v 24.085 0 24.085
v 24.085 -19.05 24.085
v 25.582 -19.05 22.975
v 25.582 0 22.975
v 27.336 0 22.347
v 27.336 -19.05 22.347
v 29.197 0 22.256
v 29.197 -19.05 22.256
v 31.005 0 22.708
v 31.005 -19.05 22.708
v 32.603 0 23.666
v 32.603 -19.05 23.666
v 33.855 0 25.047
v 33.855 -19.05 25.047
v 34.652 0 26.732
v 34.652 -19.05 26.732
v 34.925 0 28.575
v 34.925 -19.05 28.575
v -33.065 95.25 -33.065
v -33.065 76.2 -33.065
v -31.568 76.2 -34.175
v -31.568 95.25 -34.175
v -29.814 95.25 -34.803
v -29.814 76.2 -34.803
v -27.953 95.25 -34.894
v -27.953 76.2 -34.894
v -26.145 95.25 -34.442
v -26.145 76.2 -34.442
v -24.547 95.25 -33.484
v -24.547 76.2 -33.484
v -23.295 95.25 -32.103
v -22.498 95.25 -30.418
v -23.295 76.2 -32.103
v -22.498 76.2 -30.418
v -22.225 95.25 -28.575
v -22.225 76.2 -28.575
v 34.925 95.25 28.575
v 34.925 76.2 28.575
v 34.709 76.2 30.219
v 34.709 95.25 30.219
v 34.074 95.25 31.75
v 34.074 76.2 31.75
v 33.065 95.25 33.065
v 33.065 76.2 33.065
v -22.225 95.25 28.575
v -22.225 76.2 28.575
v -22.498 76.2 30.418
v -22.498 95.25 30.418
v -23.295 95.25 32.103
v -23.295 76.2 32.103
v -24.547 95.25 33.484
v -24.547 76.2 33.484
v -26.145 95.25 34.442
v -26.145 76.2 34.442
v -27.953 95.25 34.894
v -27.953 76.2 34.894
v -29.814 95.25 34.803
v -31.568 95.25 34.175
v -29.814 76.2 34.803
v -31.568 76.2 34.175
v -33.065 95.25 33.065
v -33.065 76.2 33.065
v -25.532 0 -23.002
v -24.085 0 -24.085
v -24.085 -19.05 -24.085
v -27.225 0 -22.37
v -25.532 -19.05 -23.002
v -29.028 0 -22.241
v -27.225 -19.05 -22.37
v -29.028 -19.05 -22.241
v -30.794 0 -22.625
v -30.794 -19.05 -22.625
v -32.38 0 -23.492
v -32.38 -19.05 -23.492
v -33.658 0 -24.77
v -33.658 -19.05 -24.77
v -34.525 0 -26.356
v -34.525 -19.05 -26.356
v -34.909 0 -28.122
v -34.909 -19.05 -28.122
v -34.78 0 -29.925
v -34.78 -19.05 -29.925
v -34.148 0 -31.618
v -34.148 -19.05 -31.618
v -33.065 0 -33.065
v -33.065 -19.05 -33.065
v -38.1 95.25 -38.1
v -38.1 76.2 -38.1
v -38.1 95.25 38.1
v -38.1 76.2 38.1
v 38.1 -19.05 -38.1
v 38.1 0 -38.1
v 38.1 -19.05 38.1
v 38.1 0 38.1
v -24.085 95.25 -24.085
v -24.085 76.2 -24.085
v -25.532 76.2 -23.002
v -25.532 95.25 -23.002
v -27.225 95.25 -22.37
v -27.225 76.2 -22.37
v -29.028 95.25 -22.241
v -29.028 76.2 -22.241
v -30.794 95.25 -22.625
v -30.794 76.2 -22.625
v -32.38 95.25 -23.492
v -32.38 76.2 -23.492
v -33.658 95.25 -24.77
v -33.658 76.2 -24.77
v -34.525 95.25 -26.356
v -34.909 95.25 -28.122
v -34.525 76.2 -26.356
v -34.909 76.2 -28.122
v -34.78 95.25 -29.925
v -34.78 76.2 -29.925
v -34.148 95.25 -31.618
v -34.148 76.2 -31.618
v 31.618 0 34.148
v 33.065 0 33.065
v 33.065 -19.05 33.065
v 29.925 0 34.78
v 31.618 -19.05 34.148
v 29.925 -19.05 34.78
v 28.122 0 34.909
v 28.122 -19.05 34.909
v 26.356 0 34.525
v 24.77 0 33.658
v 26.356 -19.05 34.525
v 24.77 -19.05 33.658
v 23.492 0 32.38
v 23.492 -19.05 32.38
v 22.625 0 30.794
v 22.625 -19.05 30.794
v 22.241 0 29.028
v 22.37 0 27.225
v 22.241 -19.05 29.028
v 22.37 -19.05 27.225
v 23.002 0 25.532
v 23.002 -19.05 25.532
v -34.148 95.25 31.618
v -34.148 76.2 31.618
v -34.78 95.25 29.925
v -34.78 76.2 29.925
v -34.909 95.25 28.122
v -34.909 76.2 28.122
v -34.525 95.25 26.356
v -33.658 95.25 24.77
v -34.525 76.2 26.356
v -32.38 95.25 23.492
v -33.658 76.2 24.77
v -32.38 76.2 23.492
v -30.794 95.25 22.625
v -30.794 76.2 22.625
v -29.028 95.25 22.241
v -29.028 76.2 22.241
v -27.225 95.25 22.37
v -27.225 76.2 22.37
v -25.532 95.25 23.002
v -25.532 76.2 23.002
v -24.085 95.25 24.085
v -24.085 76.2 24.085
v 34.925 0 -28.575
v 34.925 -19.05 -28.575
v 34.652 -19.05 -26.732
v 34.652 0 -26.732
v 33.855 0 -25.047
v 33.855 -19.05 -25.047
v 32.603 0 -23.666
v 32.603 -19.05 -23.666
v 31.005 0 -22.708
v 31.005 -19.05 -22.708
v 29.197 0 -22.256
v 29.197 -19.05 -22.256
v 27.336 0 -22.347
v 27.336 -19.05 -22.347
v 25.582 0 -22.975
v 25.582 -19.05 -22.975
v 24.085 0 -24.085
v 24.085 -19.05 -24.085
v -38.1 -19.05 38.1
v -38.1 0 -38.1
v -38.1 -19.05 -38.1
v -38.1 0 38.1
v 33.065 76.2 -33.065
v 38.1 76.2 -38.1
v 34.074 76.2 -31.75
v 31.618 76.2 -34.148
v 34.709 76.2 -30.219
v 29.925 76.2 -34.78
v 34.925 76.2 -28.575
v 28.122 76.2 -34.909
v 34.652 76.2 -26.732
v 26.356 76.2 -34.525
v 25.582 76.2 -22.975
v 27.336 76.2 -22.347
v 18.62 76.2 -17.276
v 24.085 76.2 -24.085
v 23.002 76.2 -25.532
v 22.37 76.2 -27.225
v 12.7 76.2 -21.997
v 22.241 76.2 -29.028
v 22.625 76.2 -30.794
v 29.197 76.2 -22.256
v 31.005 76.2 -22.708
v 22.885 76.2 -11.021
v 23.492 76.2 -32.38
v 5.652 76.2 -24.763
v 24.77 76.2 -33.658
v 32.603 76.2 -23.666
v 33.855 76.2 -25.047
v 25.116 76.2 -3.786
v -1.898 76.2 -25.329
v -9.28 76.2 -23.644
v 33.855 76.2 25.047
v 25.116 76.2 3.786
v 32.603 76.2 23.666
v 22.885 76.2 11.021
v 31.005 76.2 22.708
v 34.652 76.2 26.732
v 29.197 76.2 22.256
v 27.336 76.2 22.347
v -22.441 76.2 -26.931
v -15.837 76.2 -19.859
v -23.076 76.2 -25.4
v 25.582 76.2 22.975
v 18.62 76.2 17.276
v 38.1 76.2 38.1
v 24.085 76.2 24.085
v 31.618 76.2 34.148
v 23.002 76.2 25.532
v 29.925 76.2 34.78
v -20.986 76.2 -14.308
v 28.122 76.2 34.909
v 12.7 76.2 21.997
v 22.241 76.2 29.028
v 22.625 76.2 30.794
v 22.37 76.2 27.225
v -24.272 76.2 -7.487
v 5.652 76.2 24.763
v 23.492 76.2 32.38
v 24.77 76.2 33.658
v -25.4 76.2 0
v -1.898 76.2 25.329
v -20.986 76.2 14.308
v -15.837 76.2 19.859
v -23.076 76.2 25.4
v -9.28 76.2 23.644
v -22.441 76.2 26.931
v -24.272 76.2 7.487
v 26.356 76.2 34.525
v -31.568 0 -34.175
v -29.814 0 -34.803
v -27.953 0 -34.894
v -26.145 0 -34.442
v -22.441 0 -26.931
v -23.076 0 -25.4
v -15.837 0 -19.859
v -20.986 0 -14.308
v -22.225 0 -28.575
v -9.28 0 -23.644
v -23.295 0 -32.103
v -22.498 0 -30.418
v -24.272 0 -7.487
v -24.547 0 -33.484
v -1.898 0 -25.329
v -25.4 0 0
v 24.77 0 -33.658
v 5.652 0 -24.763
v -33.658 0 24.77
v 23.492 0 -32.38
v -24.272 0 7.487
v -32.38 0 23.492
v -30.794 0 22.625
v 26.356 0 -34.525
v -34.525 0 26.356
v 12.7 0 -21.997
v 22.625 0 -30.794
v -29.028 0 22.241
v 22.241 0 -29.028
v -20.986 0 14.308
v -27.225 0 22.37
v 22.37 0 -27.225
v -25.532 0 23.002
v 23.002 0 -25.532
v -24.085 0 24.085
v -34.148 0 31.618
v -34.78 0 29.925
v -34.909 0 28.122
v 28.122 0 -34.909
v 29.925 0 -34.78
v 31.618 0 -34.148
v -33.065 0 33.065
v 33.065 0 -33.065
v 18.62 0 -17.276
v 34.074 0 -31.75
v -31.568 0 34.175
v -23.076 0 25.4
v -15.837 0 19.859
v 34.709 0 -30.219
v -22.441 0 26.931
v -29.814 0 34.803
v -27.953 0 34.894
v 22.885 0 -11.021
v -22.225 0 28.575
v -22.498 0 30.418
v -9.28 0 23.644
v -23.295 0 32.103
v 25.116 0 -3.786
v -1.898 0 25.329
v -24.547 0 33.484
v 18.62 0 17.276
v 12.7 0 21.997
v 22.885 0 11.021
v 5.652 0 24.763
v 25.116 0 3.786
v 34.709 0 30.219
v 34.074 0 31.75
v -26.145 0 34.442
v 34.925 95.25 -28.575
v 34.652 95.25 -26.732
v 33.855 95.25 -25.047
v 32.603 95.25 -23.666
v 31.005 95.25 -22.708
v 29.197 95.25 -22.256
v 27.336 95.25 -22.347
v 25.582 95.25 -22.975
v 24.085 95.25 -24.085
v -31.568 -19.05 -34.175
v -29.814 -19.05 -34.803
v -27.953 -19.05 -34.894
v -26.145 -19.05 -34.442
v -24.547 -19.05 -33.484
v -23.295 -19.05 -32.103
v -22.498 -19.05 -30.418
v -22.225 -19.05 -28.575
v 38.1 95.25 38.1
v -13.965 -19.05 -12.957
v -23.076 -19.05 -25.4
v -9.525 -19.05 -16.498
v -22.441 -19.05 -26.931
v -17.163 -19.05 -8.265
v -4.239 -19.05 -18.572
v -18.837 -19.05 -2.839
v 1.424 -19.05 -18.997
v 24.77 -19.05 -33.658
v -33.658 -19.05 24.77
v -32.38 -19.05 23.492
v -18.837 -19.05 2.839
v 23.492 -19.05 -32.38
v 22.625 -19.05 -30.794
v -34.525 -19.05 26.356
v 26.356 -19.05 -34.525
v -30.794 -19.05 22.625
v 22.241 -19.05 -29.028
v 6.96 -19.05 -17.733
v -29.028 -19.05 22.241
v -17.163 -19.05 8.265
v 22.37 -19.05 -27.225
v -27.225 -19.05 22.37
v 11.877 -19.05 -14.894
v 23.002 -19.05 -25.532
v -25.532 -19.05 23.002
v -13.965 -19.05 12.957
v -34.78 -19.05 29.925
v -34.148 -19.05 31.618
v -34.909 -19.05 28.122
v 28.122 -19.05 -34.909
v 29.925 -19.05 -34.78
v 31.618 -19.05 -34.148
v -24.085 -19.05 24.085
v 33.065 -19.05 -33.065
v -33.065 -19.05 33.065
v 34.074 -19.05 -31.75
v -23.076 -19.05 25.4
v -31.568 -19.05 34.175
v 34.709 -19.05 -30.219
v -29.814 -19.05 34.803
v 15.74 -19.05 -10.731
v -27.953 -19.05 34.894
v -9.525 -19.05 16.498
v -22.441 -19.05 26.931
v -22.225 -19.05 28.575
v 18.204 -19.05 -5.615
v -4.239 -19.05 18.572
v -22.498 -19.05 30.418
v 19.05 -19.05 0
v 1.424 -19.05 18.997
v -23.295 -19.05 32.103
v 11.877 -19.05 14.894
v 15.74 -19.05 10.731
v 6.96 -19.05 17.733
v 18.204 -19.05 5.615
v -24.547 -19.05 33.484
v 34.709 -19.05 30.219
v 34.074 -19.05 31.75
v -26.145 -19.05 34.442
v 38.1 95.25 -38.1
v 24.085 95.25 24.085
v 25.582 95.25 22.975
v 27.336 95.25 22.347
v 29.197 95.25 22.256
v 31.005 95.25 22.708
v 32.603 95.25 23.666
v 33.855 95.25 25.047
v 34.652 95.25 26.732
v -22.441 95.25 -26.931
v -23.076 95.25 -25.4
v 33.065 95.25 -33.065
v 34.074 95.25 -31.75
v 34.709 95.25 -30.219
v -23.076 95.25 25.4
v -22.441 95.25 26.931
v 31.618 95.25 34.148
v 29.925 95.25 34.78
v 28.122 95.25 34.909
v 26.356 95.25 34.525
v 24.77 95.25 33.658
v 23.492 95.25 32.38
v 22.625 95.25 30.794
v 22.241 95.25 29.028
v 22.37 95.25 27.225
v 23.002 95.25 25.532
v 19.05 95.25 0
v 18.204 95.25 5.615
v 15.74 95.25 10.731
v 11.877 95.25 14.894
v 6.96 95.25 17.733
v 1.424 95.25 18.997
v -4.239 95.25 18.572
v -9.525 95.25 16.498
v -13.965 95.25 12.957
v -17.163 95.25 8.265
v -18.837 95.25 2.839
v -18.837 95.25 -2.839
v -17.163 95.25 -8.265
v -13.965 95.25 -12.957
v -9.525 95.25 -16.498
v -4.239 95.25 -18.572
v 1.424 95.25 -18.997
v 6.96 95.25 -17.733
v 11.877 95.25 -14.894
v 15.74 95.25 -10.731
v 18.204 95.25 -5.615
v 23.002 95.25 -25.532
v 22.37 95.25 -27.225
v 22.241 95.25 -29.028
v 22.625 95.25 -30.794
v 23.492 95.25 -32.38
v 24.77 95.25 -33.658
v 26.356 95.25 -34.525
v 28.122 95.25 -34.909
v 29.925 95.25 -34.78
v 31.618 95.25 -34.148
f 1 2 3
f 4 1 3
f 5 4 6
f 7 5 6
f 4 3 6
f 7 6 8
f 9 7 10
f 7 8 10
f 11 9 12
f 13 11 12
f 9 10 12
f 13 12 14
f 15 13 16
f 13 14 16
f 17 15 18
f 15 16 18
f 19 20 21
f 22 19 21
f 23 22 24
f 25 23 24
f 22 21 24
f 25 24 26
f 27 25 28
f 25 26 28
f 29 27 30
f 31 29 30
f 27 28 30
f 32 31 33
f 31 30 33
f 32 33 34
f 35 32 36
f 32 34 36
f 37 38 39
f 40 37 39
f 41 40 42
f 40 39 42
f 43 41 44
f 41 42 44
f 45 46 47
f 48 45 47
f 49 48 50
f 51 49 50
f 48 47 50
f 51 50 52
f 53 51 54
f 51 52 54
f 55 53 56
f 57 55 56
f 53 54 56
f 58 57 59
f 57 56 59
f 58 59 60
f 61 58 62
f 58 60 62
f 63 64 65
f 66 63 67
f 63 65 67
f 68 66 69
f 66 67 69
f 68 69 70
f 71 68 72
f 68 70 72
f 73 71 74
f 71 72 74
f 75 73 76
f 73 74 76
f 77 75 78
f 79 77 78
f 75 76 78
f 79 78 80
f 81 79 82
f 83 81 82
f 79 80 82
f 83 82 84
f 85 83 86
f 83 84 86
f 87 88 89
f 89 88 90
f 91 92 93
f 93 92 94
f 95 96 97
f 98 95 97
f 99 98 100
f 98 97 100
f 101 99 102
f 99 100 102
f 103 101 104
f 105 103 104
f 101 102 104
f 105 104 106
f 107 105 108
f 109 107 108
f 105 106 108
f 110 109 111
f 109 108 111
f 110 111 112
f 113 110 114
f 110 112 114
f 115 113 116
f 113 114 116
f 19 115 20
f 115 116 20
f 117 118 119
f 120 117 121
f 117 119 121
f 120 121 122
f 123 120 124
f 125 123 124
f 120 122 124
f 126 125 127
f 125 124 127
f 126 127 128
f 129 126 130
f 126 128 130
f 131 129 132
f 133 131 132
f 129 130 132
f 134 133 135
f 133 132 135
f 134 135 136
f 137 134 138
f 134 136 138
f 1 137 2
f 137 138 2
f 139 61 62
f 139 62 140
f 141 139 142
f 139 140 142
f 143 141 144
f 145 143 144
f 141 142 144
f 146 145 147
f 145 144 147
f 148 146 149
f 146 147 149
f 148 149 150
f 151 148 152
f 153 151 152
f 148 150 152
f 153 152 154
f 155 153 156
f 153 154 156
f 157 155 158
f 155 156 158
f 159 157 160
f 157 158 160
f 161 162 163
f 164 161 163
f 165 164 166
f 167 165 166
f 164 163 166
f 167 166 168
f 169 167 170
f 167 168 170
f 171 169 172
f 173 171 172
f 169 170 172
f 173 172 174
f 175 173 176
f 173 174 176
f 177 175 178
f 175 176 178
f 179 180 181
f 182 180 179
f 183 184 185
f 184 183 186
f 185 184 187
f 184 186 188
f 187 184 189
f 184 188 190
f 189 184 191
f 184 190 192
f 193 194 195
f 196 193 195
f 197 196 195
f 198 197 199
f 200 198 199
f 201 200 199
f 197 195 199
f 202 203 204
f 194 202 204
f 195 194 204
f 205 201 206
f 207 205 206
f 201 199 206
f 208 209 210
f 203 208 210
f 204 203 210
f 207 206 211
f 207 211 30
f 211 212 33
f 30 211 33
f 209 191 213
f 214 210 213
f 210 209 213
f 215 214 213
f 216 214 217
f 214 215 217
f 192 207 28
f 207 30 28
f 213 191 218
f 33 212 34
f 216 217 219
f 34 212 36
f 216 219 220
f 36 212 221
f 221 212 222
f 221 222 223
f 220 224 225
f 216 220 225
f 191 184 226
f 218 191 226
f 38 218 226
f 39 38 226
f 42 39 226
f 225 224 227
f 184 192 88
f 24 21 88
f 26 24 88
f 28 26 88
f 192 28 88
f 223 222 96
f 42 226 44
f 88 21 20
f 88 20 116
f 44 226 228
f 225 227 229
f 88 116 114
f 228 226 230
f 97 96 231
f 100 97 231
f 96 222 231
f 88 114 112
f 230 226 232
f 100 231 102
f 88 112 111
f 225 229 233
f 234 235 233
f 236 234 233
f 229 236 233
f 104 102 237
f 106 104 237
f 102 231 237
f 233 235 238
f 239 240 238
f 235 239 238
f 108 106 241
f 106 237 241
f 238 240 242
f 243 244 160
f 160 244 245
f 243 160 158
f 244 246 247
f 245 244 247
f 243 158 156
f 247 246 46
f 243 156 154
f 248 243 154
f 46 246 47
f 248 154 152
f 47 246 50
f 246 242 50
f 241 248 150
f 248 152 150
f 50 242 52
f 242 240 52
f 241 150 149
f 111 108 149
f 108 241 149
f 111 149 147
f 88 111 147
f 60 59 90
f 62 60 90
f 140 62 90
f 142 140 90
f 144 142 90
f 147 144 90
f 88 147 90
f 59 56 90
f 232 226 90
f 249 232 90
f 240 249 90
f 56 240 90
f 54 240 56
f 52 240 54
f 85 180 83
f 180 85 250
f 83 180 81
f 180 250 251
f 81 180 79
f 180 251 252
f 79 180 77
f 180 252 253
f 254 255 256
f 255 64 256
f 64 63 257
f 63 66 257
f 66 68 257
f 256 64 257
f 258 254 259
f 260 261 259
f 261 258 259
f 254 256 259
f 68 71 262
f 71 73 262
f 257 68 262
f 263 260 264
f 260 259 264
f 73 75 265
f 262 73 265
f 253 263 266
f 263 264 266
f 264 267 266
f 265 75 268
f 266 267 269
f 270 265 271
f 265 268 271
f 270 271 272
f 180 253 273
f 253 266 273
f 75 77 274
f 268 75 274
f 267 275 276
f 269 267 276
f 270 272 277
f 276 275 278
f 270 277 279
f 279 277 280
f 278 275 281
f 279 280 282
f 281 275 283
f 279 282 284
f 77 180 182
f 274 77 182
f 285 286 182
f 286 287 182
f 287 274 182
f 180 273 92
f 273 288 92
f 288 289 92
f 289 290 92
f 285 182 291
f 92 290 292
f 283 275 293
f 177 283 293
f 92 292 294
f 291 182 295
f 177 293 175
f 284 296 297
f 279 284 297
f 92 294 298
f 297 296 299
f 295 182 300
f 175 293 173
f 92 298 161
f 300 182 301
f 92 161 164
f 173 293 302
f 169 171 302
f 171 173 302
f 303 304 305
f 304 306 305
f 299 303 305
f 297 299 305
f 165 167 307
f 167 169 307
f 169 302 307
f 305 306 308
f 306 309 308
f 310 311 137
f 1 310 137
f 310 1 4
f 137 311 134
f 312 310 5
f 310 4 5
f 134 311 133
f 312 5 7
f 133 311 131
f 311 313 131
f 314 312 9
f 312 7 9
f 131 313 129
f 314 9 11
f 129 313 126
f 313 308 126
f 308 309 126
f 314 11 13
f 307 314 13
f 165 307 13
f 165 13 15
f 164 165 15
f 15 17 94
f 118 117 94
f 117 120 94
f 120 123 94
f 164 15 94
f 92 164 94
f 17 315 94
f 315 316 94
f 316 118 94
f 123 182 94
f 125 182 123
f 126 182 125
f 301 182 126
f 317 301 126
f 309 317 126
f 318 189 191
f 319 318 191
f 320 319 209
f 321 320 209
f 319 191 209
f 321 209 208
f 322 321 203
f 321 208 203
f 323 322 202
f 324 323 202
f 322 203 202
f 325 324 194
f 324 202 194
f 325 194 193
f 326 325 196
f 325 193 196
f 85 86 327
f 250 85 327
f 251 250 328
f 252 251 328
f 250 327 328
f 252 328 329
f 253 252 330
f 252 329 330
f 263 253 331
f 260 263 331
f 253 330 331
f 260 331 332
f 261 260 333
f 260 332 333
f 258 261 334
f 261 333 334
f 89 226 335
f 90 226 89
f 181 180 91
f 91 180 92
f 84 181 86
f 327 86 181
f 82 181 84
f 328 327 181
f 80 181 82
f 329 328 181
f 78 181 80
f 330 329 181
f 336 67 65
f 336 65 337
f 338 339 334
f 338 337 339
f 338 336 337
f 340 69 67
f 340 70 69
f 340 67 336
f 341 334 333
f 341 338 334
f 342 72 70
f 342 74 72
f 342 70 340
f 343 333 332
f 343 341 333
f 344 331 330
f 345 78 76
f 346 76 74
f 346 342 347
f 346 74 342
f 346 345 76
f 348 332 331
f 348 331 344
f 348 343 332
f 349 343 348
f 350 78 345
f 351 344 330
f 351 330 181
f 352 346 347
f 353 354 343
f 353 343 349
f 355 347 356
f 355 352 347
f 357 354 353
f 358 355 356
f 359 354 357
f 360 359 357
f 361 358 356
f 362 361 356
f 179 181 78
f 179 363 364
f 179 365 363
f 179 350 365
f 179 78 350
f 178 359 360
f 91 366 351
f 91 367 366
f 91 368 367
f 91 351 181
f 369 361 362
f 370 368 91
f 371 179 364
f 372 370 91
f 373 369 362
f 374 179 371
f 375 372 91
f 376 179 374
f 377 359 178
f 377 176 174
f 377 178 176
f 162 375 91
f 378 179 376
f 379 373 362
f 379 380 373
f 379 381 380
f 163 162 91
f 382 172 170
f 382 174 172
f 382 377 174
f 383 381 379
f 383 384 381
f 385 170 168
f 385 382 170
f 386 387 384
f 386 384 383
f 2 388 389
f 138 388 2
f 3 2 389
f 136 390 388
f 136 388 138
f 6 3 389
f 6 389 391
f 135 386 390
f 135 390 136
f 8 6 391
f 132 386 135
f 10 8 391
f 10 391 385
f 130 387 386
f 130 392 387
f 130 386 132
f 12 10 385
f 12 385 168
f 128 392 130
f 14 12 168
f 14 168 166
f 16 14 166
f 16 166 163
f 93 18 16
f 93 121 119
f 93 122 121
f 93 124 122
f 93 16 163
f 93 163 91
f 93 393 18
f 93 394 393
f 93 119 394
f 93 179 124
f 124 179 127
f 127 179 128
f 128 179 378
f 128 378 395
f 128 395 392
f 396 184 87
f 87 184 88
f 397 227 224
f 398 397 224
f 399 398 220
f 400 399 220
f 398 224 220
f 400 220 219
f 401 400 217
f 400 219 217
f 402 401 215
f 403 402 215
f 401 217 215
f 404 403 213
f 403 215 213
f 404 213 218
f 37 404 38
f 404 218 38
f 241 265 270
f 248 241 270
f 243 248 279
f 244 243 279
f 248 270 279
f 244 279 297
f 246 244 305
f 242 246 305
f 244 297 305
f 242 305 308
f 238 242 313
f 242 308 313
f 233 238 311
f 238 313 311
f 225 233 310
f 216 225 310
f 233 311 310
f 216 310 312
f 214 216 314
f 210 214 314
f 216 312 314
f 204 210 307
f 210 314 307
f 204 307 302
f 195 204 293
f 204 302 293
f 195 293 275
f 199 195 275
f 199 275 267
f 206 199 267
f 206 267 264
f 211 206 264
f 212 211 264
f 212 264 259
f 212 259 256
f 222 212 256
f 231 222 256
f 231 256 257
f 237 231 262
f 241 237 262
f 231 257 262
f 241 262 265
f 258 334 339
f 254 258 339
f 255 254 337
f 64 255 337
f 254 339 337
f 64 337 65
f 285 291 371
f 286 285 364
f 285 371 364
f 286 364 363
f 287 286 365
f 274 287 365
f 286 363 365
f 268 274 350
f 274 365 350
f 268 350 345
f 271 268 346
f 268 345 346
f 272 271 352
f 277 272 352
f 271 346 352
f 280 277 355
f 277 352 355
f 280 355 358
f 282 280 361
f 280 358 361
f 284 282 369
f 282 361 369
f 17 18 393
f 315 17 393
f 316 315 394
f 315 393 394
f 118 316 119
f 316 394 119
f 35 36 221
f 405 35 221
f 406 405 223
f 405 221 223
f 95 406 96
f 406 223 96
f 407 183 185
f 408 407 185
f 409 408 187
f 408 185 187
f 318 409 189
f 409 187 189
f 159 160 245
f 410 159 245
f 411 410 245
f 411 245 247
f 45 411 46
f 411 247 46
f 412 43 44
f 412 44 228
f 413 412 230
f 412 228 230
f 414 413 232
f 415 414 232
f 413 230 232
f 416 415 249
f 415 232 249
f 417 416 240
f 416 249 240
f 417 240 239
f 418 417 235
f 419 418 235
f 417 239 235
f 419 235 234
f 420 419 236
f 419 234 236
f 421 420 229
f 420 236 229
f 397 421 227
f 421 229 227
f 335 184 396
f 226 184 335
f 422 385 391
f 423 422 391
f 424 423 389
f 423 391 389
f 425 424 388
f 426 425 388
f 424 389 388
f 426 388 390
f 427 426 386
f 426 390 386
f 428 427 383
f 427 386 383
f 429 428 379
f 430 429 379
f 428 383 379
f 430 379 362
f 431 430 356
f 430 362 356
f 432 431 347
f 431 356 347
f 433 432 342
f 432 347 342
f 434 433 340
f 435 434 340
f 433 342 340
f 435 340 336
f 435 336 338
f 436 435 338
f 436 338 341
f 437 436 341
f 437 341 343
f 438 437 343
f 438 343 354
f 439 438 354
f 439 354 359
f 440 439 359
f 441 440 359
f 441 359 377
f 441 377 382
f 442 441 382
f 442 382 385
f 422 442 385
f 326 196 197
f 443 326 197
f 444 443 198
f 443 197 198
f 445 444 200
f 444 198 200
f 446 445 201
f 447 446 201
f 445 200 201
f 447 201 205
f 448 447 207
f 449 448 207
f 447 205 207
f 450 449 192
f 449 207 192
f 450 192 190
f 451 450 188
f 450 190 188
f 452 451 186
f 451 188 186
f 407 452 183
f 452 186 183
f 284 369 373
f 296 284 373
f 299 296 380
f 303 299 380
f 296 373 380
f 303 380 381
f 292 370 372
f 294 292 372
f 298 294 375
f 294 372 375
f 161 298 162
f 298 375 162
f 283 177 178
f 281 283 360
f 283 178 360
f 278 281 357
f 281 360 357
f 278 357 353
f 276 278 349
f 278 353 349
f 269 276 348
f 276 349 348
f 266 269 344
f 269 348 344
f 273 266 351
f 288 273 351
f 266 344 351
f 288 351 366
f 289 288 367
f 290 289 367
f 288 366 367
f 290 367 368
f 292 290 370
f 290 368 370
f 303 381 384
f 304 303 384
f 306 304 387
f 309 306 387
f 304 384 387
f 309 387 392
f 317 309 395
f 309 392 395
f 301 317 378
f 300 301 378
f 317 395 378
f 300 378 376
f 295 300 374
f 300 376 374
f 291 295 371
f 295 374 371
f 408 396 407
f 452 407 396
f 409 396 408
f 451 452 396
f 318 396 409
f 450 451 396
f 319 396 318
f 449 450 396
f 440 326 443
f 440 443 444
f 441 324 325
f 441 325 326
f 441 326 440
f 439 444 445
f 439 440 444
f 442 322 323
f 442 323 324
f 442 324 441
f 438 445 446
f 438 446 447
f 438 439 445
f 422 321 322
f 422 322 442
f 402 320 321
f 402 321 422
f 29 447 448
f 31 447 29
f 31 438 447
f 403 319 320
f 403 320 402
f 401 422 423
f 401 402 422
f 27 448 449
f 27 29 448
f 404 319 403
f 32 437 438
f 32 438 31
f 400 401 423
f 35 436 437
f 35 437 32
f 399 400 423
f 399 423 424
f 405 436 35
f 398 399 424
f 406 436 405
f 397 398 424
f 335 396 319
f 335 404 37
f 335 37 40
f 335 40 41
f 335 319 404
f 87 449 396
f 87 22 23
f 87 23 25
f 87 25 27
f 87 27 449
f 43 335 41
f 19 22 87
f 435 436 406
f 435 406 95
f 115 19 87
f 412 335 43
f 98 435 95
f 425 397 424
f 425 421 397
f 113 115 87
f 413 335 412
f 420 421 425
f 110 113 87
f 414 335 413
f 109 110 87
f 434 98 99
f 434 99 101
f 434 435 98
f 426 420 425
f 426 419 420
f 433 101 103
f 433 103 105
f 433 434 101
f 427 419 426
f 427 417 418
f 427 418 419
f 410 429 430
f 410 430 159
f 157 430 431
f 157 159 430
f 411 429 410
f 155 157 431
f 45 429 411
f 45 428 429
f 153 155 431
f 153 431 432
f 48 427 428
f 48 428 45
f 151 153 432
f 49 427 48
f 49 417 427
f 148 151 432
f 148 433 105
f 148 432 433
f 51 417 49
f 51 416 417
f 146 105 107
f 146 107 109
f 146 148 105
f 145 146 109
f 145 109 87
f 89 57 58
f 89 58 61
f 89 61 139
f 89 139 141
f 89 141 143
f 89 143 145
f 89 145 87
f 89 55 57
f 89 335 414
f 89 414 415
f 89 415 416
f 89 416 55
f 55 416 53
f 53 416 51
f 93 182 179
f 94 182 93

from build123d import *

# Parameters (mm, degrees)
F0_W      = 76.2
F0_H      = 76.2
F1_DEPTH  = 19.05
F2_R      = 25.4
F3_DEPTH  = 76.2
F4_W      = 76.2
F4_H      = 76.2
F5_DEPTH  = 19.05
F6_R      = 19.05
F7_DEPTH  = 122.174
F9_DEPTH  = 125.222
F11_DEPTH = 131.826
F13_DEPTH = 129.54
F15_DEPTH = 127


with BuildPart() as f1:
    # F0 (on Front) → F1 (new body)
    with BuildSketch(Plane.XZ):
        Rectangle(F0_W, F0_H)
    extrude(amount=F1_DEPTH)

    # F2 (on face) → F3 (join)
    with BuildSketch(Plane(origin=(0, 0, 0), x_dir=(-1, 0, 0), z_dir=(0, 1, 0))):
        Circle(F2_R)
    extrude(amount=F3_DEPTH)

    # F4 (on face) → F5 (join)
    with BuildSketch(Plane(origin=(0, 76.2, 0), x_dir=(-1, 0, 0), z_dir=(0, 1, 0))):
        Rectangle(F4_W, F4_H)
    extrude(amount=F5_DEPTH)

    # F6 (on face) → F7 (cut)
    with BuildSketch(Plane.XZ.offset(19.05)):
        Circle(F6_R)
    extrude(amount=-F7_DEPTH, mode=Mode.SUBTRACT)

    # F8 (on face) → F9 (cut)
    with BuildSketch(Plane.XZ.offset(19.05)):
        with BuildLine():
            ThreePointArc((-22.225, 28.575), (-26.14496, 34.441635), (-33.065128, 33.065128))
            Line((-33.065128, 33.065128), (-24.084872, 24.084872))
            ThreePointArc((-24.084872, 24.084872), (-22.708365, 26.14496), (-22.225, 28.575))
        make_face()
        with BuildLine():
            Line((-24.084872, 24.084872), (-33.065128, 33.065128))
            ThreePointArc((-33.065128, 33.065128), (-33.065128, 24.084872), (-24.084872, 24.084872))
        make_face()
    extrude(amount=-F9_DEPTH, mode=Mode.SUBTRACT)

    # F10 (on face) → F11 (cut)
    with BuildSketch(Plane.XZ.offset(19.05)):
        with BuildLine():
            ThreePointArc((34.925, 28.575), (34.441635, 31.00504), (33.065128, 33.065128))
            Line((33.065128, 33.065128), (24.084872, 24.084872))
            ThreePointArc((24.084872, 24.084872), (31.00504, 22.708365), (34.925, 28.575))
        make_face()
        with BuildLine():
            Line((24.084872, 24.084872), (33.065128, 33.065128))
            ThreePointArc((33.065128, 33.065128), (24.084872, 33.065128), (24.084872, 24.084872))
        make_face()
    extrude(amount=-F11_DEPTH, mode=Mode.SUBTRACT)

    # F12 (on face) → F13 (cut)
    with BuildSketch(Plane.XZ.offset(19.05)):
        with BuildLine():
            ThreePointArc((-24.084872, -24.084872), (-33.065128, -24.084872), (-33.065128, -33.065128))
            Line((-33.065128, -33.065128), (-24.084872, -24.084872))
        make_face()
        with BuildLine():
            Line((-24.084872, -24.084872), (-33.065128, -33.065128))
            ThreePointArc((-33.065128, -33.065128), (-26.14496, -34.441635), (-22.225, -28.575))
            ThreePointArc((-22.225, -28.575), (-22.708365, -26.14496), (-24.084872, -24.084872))
        make_face()
    extrude(amount=-F13_DEPTH, mode=Mode.SUBTRACT)

    # F14 (on face) → F15 (cut)
    with BuildSketch(Plane.XZ.offset(19.05)):
        with BuildLine():
            ThreePointArc((34.925, -28.575), (31.00504, -22.708365), (24.084872, -24.084872))
            Line((24.084872, -24.084872), (33.065128, -33.065128))
            ThreePointArc((33.065128, -33.065128), (34.441635, -31.00504), (34.925, -28.575))
        make_face()
        with BuildLine():
            Line((33.065128, -33.065128), (24.084872, -24.084872))
            ThreePointArc((24.084872, -24.084872), (24.084872, -33.065128), (33.065128, -33.065128))
        make_face()
    extrude(amount=-F15_DEPTH, mode=Mode.SUBTRACT)


solid = f1.part
